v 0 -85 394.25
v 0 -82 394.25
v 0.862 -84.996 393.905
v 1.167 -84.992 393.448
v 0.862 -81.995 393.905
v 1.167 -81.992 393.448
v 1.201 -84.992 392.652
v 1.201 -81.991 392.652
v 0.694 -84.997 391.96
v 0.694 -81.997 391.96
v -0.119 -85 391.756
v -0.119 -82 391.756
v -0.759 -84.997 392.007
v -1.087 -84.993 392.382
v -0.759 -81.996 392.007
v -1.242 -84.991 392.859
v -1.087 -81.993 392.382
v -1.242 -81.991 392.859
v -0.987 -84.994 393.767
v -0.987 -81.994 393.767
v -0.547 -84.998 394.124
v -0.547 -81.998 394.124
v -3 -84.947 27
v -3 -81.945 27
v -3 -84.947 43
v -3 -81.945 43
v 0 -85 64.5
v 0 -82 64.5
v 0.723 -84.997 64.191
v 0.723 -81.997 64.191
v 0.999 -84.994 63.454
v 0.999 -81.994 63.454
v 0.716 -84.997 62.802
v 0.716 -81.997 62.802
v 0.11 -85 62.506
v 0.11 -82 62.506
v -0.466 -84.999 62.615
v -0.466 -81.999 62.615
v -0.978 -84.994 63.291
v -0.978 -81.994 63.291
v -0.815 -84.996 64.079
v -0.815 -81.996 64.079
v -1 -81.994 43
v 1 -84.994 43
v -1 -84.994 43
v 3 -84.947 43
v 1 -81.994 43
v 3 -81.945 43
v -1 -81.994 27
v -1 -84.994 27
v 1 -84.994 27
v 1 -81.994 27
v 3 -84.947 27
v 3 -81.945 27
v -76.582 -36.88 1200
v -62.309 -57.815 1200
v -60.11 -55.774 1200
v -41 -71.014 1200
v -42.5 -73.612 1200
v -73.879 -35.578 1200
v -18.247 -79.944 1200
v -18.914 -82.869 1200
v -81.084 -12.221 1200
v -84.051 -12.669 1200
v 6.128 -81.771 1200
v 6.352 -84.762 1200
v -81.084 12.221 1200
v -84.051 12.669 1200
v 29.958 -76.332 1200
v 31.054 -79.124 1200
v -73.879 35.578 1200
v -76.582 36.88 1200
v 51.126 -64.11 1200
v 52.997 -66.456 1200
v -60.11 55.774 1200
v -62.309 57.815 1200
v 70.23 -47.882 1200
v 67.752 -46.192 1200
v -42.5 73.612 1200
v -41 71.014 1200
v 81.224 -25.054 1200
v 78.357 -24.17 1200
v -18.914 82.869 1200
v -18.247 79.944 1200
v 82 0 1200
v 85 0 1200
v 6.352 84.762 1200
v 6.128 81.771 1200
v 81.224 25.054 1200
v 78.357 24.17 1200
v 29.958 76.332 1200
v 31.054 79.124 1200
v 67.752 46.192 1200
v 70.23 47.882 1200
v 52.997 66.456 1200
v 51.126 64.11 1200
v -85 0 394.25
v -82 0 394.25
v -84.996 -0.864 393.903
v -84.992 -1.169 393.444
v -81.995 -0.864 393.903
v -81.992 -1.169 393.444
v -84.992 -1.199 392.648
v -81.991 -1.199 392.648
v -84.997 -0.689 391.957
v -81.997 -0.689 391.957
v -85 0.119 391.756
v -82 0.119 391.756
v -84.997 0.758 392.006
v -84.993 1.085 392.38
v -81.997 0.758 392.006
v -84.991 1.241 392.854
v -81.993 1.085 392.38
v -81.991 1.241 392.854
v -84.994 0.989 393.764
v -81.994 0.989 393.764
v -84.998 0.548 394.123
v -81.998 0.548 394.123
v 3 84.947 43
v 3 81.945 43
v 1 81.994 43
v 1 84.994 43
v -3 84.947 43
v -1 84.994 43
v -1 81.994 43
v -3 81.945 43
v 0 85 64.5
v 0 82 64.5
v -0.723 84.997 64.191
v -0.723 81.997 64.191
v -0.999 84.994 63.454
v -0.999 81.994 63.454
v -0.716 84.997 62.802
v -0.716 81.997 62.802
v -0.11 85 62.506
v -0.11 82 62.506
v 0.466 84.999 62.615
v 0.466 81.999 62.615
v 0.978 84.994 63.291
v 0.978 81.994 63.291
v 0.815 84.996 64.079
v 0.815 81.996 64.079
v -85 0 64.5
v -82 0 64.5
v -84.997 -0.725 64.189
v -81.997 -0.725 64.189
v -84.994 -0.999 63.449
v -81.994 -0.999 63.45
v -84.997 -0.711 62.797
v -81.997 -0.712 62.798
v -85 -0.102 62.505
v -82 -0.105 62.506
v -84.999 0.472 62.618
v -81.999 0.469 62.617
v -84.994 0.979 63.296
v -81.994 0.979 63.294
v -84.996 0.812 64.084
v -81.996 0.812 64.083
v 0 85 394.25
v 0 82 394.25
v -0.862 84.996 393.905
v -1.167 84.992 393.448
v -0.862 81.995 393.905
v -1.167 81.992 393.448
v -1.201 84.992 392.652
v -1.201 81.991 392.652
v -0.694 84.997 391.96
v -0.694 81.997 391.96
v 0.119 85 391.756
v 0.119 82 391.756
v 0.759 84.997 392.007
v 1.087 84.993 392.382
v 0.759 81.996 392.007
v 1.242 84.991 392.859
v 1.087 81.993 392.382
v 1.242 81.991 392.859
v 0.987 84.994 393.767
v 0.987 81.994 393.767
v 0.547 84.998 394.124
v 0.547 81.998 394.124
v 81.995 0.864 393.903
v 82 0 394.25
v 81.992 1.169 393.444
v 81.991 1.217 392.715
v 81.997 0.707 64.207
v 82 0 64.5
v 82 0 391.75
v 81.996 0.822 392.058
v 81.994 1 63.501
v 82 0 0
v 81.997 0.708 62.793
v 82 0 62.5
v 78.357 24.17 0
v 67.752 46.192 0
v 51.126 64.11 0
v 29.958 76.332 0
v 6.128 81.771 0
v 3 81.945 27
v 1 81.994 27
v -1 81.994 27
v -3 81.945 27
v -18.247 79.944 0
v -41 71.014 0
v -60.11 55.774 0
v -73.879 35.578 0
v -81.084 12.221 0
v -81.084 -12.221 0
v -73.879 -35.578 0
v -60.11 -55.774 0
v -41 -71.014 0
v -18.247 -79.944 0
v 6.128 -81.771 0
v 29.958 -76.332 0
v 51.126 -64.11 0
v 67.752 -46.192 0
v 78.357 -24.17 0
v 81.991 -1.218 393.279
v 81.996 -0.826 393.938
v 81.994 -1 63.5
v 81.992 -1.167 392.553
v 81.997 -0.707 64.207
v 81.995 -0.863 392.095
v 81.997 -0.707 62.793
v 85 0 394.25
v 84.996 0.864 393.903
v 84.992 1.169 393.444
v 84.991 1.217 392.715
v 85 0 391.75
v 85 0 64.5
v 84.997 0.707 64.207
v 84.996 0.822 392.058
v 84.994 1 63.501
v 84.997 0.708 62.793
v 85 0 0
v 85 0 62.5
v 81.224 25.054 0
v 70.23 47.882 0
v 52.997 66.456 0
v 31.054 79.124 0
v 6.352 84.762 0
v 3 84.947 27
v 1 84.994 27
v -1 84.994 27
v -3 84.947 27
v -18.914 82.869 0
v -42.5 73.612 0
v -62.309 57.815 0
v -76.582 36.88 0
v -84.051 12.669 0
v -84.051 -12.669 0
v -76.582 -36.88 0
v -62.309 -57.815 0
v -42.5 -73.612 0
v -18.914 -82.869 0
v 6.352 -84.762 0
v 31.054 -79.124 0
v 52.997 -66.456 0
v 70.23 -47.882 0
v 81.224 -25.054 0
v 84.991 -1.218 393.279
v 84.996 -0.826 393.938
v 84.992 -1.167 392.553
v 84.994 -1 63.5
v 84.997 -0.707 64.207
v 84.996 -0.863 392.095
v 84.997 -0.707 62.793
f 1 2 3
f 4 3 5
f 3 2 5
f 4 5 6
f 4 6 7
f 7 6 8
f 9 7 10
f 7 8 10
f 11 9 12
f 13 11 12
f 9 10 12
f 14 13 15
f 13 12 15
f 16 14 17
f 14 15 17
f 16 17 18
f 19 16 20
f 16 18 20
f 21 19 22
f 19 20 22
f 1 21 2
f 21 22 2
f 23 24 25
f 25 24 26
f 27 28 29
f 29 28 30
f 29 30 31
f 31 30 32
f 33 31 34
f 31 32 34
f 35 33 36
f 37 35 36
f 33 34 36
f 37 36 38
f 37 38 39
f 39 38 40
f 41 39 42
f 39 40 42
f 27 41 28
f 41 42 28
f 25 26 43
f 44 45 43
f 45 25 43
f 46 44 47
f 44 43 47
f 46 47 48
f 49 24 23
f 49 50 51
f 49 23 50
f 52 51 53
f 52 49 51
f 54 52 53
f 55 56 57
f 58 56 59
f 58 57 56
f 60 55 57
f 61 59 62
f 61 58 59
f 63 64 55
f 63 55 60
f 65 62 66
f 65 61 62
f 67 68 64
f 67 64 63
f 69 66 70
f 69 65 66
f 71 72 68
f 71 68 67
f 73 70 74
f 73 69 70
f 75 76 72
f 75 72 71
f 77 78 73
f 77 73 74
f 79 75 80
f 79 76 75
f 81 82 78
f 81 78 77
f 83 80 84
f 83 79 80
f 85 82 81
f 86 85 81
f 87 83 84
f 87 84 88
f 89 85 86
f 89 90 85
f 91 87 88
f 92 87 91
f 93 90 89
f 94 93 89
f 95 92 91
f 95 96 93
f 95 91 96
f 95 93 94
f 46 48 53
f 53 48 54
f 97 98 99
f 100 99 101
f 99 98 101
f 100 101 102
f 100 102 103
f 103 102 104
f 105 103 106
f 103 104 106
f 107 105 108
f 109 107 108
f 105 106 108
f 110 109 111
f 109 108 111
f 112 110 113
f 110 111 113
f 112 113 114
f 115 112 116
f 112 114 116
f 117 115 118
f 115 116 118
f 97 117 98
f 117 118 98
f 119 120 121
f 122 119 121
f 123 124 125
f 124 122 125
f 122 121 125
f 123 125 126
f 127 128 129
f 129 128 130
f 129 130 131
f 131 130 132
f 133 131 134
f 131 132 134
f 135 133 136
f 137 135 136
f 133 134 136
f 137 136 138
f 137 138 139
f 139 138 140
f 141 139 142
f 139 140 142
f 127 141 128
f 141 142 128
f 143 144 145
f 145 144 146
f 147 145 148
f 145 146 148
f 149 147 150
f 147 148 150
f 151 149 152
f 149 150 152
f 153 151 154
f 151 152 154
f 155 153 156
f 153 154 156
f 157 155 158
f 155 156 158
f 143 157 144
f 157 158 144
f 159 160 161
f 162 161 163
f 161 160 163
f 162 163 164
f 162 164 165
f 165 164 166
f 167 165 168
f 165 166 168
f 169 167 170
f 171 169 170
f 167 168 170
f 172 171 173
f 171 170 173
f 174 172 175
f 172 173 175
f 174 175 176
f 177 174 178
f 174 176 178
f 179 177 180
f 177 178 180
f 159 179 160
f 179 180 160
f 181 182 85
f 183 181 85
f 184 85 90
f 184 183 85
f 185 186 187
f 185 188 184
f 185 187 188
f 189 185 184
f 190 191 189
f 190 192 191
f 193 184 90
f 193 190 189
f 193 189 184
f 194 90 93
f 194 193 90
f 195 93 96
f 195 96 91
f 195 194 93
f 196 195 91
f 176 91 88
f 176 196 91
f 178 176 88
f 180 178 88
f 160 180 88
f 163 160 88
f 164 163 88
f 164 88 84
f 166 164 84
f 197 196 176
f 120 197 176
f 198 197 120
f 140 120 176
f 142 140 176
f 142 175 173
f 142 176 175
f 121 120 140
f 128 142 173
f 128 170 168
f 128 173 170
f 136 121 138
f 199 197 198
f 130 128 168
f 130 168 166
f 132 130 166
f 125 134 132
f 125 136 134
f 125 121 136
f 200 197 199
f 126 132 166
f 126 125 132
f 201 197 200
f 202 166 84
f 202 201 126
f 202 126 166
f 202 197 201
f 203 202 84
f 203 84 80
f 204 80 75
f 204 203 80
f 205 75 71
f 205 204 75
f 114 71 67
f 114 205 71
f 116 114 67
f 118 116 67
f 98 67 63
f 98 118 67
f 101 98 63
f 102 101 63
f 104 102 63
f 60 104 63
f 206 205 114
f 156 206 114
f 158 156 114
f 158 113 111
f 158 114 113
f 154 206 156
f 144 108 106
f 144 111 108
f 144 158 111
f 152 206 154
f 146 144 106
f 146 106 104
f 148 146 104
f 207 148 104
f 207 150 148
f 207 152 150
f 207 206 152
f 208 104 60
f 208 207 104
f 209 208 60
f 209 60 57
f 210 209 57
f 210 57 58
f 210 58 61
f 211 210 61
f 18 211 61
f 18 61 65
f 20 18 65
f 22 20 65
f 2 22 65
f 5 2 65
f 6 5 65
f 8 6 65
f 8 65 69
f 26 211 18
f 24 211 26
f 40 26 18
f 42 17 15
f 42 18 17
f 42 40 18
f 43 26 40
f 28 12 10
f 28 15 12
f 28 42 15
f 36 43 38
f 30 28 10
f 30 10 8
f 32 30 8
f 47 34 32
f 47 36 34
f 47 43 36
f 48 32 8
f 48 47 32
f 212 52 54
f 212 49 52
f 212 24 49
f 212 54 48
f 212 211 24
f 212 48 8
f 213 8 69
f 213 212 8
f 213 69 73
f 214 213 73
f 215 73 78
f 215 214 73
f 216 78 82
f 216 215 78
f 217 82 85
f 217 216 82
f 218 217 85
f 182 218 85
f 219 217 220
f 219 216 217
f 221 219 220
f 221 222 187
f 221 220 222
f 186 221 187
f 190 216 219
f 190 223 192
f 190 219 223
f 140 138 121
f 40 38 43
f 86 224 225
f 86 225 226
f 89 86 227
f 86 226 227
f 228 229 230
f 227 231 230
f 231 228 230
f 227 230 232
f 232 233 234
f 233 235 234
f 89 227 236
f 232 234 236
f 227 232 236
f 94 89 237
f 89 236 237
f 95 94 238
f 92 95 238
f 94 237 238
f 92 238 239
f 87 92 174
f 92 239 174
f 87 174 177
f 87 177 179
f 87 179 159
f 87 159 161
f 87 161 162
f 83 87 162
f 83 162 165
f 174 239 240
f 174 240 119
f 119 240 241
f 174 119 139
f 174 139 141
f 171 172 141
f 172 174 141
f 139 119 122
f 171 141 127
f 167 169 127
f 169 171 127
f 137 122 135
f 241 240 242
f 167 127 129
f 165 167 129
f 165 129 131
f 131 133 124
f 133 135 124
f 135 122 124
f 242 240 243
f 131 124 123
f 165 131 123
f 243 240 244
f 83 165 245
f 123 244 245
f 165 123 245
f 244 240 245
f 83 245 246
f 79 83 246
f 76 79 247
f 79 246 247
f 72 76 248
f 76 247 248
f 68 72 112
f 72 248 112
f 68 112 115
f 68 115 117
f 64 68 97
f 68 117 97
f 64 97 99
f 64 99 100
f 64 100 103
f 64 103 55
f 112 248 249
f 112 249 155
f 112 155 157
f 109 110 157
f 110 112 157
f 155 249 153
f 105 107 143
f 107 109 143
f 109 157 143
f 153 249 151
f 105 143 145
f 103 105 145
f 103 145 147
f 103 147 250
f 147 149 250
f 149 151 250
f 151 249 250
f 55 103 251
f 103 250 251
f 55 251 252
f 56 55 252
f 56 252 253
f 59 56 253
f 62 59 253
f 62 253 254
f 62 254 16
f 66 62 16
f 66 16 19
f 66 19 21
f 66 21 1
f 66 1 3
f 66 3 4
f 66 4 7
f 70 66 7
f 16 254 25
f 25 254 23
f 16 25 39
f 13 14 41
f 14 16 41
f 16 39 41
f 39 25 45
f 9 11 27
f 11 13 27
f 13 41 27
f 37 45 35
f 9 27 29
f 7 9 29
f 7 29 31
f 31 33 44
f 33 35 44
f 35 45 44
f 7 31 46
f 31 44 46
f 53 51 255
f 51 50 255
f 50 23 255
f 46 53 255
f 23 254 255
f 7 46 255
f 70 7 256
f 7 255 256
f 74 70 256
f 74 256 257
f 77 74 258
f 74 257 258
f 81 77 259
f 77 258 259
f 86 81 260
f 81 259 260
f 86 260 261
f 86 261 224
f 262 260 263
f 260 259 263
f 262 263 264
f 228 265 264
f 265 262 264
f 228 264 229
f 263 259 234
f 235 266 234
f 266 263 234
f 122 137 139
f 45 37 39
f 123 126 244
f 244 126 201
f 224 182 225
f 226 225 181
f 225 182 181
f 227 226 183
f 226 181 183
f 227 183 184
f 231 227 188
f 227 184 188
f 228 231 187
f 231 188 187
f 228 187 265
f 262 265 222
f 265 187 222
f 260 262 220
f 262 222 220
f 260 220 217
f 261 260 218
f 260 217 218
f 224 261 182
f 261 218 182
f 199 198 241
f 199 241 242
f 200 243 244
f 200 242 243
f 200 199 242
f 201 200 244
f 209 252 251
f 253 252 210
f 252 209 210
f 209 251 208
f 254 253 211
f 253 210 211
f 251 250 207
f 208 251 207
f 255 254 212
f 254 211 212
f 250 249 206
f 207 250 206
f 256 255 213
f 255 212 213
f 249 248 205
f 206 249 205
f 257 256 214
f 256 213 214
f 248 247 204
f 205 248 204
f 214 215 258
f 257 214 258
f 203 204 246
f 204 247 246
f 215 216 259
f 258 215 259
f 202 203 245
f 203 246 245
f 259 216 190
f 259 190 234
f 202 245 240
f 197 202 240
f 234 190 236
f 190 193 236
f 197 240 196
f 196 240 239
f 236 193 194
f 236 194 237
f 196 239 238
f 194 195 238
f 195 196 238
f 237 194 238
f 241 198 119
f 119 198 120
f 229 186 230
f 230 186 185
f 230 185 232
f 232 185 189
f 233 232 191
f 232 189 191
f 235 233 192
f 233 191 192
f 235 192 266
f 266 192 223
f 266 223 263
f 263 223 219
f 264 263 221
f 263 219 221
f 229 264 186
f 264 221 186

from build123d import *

# Parameters (mm, degrees)
SKETCH1_R           = 85
SKETCH1_R_2         = 82
BOSS_EXTRUDE1_DEPTH = 1200
SKETCH2_R           = 1.25
CUT_EXTRUDE1_DEPTH  = 900
CIRPATTERN1_COUNT   = 4
SKETCH3_W           = 6
SKETCH3_H           = 6
SKETCH3_H_2         = 10
CUT_EXTRUDE2_DEPTH  = 104
CIRPATTERN2_COUNT   = 2
SKETCH5_R           = 1
CUT_EXTRUDE3_DEPTH  = 104
CIRPATTERN3_COUNT   = 4


with BuildPart() as part:
    # Sketch1 → Boss-Extrude1 (new body)
    with BuildSketch(Plane.XY):
        Circle(SKETCH1_R)
        Circle(SKETCH1_R_2, mode=Mode.SUBTRACT)
    extrude(amount=BOSS_EXTRUDE1_DEPTH)

    # Sketch2 → Cut-Extrude1 (cut)
    with BuildSketch(Plane(origin=(0, 0, 0), x_dir=(1, 0, 0), z_dir=(0, 1, 0))):
        with Locations(Location((0, -393, 0), (0, 0, 270))):
            Circle(SKETCH2_R)
    cut_extrude1 = extrude(amount=-CUT_EXTRUDE1_DEPTH, mode=Mode.SUBTRACT)

    # CirPattern1: Cut-Extrude1 ×4 about axis
    cirpattern1_axis = Axis((0, 0, 0), (0, 0, 1))
    for i in range(1, CIRPATTERN1_COUNT):
        add(cut_extrude1.rotate(cirpattern1_axis, i * 360 / CIRPATTERN1_COUNT), mode=Mode.SUBTRACT)

    # Sketch3 → Cut-Extrude2 (cut)
    with BuildSketch(Plane(origin=(0, 0, 0), x_dir=(1, 0, 0), z_dir=(0, 1, 0))):
        with Locations((0, -30)):
            Rectangle(SKETCH3_W, SKETCH3_H)
        with Locations((0, -38)):
            Rectangle(SKETCH3_W, SKETCH3_H_2)
    cut_extrude2 = extrude(amount=-CUT_EXTRUDE2_DEPTH, mode=Mode.SUBTRACT)

    # CirPattern2: Cut-Extrude2 ×2 about axis
    cirpattern2_axis = Axis((0, 0, 0), (0, 0, 1))
    for i in range(1, CIRPATTERN2_COUNT):
        add(cut_extrude2.rotate(cirpattern2_axis, i * 360 / CIRPATTERN2_COUNT), mode=Mode.SUBTRACT)

    # Sketch5 → Cut-Extrude3 (cut)
    with BuildSketch(Plane(origin=(0, 0, 0), x_dir=(1, 0, 0), z_dir=(0, 1, 0))):
        with Locations(Location((0, -63.5, 0), (0, 0, 270))):
            Circle(SKETCH5_R)
    cut_extrude3 = extrude(amount=-CUT_EXTRUDE3_DEPTH, mode=Mode.SUBTRACT)

    # CirPattern3: Cut-Extrude3 ×4 about axis
    cirpattern3_axis = Axis((0, 0, 0), (0, 0, 1))
    for i in range(1, CIRPATTERN3_COUNT):
        add(cut_extrude3.rotate(cirpattern3_axis, i * 360 / CIRPATTERN3_COUNT), mode=Mode.SUBTRACT)


solid = part.part
